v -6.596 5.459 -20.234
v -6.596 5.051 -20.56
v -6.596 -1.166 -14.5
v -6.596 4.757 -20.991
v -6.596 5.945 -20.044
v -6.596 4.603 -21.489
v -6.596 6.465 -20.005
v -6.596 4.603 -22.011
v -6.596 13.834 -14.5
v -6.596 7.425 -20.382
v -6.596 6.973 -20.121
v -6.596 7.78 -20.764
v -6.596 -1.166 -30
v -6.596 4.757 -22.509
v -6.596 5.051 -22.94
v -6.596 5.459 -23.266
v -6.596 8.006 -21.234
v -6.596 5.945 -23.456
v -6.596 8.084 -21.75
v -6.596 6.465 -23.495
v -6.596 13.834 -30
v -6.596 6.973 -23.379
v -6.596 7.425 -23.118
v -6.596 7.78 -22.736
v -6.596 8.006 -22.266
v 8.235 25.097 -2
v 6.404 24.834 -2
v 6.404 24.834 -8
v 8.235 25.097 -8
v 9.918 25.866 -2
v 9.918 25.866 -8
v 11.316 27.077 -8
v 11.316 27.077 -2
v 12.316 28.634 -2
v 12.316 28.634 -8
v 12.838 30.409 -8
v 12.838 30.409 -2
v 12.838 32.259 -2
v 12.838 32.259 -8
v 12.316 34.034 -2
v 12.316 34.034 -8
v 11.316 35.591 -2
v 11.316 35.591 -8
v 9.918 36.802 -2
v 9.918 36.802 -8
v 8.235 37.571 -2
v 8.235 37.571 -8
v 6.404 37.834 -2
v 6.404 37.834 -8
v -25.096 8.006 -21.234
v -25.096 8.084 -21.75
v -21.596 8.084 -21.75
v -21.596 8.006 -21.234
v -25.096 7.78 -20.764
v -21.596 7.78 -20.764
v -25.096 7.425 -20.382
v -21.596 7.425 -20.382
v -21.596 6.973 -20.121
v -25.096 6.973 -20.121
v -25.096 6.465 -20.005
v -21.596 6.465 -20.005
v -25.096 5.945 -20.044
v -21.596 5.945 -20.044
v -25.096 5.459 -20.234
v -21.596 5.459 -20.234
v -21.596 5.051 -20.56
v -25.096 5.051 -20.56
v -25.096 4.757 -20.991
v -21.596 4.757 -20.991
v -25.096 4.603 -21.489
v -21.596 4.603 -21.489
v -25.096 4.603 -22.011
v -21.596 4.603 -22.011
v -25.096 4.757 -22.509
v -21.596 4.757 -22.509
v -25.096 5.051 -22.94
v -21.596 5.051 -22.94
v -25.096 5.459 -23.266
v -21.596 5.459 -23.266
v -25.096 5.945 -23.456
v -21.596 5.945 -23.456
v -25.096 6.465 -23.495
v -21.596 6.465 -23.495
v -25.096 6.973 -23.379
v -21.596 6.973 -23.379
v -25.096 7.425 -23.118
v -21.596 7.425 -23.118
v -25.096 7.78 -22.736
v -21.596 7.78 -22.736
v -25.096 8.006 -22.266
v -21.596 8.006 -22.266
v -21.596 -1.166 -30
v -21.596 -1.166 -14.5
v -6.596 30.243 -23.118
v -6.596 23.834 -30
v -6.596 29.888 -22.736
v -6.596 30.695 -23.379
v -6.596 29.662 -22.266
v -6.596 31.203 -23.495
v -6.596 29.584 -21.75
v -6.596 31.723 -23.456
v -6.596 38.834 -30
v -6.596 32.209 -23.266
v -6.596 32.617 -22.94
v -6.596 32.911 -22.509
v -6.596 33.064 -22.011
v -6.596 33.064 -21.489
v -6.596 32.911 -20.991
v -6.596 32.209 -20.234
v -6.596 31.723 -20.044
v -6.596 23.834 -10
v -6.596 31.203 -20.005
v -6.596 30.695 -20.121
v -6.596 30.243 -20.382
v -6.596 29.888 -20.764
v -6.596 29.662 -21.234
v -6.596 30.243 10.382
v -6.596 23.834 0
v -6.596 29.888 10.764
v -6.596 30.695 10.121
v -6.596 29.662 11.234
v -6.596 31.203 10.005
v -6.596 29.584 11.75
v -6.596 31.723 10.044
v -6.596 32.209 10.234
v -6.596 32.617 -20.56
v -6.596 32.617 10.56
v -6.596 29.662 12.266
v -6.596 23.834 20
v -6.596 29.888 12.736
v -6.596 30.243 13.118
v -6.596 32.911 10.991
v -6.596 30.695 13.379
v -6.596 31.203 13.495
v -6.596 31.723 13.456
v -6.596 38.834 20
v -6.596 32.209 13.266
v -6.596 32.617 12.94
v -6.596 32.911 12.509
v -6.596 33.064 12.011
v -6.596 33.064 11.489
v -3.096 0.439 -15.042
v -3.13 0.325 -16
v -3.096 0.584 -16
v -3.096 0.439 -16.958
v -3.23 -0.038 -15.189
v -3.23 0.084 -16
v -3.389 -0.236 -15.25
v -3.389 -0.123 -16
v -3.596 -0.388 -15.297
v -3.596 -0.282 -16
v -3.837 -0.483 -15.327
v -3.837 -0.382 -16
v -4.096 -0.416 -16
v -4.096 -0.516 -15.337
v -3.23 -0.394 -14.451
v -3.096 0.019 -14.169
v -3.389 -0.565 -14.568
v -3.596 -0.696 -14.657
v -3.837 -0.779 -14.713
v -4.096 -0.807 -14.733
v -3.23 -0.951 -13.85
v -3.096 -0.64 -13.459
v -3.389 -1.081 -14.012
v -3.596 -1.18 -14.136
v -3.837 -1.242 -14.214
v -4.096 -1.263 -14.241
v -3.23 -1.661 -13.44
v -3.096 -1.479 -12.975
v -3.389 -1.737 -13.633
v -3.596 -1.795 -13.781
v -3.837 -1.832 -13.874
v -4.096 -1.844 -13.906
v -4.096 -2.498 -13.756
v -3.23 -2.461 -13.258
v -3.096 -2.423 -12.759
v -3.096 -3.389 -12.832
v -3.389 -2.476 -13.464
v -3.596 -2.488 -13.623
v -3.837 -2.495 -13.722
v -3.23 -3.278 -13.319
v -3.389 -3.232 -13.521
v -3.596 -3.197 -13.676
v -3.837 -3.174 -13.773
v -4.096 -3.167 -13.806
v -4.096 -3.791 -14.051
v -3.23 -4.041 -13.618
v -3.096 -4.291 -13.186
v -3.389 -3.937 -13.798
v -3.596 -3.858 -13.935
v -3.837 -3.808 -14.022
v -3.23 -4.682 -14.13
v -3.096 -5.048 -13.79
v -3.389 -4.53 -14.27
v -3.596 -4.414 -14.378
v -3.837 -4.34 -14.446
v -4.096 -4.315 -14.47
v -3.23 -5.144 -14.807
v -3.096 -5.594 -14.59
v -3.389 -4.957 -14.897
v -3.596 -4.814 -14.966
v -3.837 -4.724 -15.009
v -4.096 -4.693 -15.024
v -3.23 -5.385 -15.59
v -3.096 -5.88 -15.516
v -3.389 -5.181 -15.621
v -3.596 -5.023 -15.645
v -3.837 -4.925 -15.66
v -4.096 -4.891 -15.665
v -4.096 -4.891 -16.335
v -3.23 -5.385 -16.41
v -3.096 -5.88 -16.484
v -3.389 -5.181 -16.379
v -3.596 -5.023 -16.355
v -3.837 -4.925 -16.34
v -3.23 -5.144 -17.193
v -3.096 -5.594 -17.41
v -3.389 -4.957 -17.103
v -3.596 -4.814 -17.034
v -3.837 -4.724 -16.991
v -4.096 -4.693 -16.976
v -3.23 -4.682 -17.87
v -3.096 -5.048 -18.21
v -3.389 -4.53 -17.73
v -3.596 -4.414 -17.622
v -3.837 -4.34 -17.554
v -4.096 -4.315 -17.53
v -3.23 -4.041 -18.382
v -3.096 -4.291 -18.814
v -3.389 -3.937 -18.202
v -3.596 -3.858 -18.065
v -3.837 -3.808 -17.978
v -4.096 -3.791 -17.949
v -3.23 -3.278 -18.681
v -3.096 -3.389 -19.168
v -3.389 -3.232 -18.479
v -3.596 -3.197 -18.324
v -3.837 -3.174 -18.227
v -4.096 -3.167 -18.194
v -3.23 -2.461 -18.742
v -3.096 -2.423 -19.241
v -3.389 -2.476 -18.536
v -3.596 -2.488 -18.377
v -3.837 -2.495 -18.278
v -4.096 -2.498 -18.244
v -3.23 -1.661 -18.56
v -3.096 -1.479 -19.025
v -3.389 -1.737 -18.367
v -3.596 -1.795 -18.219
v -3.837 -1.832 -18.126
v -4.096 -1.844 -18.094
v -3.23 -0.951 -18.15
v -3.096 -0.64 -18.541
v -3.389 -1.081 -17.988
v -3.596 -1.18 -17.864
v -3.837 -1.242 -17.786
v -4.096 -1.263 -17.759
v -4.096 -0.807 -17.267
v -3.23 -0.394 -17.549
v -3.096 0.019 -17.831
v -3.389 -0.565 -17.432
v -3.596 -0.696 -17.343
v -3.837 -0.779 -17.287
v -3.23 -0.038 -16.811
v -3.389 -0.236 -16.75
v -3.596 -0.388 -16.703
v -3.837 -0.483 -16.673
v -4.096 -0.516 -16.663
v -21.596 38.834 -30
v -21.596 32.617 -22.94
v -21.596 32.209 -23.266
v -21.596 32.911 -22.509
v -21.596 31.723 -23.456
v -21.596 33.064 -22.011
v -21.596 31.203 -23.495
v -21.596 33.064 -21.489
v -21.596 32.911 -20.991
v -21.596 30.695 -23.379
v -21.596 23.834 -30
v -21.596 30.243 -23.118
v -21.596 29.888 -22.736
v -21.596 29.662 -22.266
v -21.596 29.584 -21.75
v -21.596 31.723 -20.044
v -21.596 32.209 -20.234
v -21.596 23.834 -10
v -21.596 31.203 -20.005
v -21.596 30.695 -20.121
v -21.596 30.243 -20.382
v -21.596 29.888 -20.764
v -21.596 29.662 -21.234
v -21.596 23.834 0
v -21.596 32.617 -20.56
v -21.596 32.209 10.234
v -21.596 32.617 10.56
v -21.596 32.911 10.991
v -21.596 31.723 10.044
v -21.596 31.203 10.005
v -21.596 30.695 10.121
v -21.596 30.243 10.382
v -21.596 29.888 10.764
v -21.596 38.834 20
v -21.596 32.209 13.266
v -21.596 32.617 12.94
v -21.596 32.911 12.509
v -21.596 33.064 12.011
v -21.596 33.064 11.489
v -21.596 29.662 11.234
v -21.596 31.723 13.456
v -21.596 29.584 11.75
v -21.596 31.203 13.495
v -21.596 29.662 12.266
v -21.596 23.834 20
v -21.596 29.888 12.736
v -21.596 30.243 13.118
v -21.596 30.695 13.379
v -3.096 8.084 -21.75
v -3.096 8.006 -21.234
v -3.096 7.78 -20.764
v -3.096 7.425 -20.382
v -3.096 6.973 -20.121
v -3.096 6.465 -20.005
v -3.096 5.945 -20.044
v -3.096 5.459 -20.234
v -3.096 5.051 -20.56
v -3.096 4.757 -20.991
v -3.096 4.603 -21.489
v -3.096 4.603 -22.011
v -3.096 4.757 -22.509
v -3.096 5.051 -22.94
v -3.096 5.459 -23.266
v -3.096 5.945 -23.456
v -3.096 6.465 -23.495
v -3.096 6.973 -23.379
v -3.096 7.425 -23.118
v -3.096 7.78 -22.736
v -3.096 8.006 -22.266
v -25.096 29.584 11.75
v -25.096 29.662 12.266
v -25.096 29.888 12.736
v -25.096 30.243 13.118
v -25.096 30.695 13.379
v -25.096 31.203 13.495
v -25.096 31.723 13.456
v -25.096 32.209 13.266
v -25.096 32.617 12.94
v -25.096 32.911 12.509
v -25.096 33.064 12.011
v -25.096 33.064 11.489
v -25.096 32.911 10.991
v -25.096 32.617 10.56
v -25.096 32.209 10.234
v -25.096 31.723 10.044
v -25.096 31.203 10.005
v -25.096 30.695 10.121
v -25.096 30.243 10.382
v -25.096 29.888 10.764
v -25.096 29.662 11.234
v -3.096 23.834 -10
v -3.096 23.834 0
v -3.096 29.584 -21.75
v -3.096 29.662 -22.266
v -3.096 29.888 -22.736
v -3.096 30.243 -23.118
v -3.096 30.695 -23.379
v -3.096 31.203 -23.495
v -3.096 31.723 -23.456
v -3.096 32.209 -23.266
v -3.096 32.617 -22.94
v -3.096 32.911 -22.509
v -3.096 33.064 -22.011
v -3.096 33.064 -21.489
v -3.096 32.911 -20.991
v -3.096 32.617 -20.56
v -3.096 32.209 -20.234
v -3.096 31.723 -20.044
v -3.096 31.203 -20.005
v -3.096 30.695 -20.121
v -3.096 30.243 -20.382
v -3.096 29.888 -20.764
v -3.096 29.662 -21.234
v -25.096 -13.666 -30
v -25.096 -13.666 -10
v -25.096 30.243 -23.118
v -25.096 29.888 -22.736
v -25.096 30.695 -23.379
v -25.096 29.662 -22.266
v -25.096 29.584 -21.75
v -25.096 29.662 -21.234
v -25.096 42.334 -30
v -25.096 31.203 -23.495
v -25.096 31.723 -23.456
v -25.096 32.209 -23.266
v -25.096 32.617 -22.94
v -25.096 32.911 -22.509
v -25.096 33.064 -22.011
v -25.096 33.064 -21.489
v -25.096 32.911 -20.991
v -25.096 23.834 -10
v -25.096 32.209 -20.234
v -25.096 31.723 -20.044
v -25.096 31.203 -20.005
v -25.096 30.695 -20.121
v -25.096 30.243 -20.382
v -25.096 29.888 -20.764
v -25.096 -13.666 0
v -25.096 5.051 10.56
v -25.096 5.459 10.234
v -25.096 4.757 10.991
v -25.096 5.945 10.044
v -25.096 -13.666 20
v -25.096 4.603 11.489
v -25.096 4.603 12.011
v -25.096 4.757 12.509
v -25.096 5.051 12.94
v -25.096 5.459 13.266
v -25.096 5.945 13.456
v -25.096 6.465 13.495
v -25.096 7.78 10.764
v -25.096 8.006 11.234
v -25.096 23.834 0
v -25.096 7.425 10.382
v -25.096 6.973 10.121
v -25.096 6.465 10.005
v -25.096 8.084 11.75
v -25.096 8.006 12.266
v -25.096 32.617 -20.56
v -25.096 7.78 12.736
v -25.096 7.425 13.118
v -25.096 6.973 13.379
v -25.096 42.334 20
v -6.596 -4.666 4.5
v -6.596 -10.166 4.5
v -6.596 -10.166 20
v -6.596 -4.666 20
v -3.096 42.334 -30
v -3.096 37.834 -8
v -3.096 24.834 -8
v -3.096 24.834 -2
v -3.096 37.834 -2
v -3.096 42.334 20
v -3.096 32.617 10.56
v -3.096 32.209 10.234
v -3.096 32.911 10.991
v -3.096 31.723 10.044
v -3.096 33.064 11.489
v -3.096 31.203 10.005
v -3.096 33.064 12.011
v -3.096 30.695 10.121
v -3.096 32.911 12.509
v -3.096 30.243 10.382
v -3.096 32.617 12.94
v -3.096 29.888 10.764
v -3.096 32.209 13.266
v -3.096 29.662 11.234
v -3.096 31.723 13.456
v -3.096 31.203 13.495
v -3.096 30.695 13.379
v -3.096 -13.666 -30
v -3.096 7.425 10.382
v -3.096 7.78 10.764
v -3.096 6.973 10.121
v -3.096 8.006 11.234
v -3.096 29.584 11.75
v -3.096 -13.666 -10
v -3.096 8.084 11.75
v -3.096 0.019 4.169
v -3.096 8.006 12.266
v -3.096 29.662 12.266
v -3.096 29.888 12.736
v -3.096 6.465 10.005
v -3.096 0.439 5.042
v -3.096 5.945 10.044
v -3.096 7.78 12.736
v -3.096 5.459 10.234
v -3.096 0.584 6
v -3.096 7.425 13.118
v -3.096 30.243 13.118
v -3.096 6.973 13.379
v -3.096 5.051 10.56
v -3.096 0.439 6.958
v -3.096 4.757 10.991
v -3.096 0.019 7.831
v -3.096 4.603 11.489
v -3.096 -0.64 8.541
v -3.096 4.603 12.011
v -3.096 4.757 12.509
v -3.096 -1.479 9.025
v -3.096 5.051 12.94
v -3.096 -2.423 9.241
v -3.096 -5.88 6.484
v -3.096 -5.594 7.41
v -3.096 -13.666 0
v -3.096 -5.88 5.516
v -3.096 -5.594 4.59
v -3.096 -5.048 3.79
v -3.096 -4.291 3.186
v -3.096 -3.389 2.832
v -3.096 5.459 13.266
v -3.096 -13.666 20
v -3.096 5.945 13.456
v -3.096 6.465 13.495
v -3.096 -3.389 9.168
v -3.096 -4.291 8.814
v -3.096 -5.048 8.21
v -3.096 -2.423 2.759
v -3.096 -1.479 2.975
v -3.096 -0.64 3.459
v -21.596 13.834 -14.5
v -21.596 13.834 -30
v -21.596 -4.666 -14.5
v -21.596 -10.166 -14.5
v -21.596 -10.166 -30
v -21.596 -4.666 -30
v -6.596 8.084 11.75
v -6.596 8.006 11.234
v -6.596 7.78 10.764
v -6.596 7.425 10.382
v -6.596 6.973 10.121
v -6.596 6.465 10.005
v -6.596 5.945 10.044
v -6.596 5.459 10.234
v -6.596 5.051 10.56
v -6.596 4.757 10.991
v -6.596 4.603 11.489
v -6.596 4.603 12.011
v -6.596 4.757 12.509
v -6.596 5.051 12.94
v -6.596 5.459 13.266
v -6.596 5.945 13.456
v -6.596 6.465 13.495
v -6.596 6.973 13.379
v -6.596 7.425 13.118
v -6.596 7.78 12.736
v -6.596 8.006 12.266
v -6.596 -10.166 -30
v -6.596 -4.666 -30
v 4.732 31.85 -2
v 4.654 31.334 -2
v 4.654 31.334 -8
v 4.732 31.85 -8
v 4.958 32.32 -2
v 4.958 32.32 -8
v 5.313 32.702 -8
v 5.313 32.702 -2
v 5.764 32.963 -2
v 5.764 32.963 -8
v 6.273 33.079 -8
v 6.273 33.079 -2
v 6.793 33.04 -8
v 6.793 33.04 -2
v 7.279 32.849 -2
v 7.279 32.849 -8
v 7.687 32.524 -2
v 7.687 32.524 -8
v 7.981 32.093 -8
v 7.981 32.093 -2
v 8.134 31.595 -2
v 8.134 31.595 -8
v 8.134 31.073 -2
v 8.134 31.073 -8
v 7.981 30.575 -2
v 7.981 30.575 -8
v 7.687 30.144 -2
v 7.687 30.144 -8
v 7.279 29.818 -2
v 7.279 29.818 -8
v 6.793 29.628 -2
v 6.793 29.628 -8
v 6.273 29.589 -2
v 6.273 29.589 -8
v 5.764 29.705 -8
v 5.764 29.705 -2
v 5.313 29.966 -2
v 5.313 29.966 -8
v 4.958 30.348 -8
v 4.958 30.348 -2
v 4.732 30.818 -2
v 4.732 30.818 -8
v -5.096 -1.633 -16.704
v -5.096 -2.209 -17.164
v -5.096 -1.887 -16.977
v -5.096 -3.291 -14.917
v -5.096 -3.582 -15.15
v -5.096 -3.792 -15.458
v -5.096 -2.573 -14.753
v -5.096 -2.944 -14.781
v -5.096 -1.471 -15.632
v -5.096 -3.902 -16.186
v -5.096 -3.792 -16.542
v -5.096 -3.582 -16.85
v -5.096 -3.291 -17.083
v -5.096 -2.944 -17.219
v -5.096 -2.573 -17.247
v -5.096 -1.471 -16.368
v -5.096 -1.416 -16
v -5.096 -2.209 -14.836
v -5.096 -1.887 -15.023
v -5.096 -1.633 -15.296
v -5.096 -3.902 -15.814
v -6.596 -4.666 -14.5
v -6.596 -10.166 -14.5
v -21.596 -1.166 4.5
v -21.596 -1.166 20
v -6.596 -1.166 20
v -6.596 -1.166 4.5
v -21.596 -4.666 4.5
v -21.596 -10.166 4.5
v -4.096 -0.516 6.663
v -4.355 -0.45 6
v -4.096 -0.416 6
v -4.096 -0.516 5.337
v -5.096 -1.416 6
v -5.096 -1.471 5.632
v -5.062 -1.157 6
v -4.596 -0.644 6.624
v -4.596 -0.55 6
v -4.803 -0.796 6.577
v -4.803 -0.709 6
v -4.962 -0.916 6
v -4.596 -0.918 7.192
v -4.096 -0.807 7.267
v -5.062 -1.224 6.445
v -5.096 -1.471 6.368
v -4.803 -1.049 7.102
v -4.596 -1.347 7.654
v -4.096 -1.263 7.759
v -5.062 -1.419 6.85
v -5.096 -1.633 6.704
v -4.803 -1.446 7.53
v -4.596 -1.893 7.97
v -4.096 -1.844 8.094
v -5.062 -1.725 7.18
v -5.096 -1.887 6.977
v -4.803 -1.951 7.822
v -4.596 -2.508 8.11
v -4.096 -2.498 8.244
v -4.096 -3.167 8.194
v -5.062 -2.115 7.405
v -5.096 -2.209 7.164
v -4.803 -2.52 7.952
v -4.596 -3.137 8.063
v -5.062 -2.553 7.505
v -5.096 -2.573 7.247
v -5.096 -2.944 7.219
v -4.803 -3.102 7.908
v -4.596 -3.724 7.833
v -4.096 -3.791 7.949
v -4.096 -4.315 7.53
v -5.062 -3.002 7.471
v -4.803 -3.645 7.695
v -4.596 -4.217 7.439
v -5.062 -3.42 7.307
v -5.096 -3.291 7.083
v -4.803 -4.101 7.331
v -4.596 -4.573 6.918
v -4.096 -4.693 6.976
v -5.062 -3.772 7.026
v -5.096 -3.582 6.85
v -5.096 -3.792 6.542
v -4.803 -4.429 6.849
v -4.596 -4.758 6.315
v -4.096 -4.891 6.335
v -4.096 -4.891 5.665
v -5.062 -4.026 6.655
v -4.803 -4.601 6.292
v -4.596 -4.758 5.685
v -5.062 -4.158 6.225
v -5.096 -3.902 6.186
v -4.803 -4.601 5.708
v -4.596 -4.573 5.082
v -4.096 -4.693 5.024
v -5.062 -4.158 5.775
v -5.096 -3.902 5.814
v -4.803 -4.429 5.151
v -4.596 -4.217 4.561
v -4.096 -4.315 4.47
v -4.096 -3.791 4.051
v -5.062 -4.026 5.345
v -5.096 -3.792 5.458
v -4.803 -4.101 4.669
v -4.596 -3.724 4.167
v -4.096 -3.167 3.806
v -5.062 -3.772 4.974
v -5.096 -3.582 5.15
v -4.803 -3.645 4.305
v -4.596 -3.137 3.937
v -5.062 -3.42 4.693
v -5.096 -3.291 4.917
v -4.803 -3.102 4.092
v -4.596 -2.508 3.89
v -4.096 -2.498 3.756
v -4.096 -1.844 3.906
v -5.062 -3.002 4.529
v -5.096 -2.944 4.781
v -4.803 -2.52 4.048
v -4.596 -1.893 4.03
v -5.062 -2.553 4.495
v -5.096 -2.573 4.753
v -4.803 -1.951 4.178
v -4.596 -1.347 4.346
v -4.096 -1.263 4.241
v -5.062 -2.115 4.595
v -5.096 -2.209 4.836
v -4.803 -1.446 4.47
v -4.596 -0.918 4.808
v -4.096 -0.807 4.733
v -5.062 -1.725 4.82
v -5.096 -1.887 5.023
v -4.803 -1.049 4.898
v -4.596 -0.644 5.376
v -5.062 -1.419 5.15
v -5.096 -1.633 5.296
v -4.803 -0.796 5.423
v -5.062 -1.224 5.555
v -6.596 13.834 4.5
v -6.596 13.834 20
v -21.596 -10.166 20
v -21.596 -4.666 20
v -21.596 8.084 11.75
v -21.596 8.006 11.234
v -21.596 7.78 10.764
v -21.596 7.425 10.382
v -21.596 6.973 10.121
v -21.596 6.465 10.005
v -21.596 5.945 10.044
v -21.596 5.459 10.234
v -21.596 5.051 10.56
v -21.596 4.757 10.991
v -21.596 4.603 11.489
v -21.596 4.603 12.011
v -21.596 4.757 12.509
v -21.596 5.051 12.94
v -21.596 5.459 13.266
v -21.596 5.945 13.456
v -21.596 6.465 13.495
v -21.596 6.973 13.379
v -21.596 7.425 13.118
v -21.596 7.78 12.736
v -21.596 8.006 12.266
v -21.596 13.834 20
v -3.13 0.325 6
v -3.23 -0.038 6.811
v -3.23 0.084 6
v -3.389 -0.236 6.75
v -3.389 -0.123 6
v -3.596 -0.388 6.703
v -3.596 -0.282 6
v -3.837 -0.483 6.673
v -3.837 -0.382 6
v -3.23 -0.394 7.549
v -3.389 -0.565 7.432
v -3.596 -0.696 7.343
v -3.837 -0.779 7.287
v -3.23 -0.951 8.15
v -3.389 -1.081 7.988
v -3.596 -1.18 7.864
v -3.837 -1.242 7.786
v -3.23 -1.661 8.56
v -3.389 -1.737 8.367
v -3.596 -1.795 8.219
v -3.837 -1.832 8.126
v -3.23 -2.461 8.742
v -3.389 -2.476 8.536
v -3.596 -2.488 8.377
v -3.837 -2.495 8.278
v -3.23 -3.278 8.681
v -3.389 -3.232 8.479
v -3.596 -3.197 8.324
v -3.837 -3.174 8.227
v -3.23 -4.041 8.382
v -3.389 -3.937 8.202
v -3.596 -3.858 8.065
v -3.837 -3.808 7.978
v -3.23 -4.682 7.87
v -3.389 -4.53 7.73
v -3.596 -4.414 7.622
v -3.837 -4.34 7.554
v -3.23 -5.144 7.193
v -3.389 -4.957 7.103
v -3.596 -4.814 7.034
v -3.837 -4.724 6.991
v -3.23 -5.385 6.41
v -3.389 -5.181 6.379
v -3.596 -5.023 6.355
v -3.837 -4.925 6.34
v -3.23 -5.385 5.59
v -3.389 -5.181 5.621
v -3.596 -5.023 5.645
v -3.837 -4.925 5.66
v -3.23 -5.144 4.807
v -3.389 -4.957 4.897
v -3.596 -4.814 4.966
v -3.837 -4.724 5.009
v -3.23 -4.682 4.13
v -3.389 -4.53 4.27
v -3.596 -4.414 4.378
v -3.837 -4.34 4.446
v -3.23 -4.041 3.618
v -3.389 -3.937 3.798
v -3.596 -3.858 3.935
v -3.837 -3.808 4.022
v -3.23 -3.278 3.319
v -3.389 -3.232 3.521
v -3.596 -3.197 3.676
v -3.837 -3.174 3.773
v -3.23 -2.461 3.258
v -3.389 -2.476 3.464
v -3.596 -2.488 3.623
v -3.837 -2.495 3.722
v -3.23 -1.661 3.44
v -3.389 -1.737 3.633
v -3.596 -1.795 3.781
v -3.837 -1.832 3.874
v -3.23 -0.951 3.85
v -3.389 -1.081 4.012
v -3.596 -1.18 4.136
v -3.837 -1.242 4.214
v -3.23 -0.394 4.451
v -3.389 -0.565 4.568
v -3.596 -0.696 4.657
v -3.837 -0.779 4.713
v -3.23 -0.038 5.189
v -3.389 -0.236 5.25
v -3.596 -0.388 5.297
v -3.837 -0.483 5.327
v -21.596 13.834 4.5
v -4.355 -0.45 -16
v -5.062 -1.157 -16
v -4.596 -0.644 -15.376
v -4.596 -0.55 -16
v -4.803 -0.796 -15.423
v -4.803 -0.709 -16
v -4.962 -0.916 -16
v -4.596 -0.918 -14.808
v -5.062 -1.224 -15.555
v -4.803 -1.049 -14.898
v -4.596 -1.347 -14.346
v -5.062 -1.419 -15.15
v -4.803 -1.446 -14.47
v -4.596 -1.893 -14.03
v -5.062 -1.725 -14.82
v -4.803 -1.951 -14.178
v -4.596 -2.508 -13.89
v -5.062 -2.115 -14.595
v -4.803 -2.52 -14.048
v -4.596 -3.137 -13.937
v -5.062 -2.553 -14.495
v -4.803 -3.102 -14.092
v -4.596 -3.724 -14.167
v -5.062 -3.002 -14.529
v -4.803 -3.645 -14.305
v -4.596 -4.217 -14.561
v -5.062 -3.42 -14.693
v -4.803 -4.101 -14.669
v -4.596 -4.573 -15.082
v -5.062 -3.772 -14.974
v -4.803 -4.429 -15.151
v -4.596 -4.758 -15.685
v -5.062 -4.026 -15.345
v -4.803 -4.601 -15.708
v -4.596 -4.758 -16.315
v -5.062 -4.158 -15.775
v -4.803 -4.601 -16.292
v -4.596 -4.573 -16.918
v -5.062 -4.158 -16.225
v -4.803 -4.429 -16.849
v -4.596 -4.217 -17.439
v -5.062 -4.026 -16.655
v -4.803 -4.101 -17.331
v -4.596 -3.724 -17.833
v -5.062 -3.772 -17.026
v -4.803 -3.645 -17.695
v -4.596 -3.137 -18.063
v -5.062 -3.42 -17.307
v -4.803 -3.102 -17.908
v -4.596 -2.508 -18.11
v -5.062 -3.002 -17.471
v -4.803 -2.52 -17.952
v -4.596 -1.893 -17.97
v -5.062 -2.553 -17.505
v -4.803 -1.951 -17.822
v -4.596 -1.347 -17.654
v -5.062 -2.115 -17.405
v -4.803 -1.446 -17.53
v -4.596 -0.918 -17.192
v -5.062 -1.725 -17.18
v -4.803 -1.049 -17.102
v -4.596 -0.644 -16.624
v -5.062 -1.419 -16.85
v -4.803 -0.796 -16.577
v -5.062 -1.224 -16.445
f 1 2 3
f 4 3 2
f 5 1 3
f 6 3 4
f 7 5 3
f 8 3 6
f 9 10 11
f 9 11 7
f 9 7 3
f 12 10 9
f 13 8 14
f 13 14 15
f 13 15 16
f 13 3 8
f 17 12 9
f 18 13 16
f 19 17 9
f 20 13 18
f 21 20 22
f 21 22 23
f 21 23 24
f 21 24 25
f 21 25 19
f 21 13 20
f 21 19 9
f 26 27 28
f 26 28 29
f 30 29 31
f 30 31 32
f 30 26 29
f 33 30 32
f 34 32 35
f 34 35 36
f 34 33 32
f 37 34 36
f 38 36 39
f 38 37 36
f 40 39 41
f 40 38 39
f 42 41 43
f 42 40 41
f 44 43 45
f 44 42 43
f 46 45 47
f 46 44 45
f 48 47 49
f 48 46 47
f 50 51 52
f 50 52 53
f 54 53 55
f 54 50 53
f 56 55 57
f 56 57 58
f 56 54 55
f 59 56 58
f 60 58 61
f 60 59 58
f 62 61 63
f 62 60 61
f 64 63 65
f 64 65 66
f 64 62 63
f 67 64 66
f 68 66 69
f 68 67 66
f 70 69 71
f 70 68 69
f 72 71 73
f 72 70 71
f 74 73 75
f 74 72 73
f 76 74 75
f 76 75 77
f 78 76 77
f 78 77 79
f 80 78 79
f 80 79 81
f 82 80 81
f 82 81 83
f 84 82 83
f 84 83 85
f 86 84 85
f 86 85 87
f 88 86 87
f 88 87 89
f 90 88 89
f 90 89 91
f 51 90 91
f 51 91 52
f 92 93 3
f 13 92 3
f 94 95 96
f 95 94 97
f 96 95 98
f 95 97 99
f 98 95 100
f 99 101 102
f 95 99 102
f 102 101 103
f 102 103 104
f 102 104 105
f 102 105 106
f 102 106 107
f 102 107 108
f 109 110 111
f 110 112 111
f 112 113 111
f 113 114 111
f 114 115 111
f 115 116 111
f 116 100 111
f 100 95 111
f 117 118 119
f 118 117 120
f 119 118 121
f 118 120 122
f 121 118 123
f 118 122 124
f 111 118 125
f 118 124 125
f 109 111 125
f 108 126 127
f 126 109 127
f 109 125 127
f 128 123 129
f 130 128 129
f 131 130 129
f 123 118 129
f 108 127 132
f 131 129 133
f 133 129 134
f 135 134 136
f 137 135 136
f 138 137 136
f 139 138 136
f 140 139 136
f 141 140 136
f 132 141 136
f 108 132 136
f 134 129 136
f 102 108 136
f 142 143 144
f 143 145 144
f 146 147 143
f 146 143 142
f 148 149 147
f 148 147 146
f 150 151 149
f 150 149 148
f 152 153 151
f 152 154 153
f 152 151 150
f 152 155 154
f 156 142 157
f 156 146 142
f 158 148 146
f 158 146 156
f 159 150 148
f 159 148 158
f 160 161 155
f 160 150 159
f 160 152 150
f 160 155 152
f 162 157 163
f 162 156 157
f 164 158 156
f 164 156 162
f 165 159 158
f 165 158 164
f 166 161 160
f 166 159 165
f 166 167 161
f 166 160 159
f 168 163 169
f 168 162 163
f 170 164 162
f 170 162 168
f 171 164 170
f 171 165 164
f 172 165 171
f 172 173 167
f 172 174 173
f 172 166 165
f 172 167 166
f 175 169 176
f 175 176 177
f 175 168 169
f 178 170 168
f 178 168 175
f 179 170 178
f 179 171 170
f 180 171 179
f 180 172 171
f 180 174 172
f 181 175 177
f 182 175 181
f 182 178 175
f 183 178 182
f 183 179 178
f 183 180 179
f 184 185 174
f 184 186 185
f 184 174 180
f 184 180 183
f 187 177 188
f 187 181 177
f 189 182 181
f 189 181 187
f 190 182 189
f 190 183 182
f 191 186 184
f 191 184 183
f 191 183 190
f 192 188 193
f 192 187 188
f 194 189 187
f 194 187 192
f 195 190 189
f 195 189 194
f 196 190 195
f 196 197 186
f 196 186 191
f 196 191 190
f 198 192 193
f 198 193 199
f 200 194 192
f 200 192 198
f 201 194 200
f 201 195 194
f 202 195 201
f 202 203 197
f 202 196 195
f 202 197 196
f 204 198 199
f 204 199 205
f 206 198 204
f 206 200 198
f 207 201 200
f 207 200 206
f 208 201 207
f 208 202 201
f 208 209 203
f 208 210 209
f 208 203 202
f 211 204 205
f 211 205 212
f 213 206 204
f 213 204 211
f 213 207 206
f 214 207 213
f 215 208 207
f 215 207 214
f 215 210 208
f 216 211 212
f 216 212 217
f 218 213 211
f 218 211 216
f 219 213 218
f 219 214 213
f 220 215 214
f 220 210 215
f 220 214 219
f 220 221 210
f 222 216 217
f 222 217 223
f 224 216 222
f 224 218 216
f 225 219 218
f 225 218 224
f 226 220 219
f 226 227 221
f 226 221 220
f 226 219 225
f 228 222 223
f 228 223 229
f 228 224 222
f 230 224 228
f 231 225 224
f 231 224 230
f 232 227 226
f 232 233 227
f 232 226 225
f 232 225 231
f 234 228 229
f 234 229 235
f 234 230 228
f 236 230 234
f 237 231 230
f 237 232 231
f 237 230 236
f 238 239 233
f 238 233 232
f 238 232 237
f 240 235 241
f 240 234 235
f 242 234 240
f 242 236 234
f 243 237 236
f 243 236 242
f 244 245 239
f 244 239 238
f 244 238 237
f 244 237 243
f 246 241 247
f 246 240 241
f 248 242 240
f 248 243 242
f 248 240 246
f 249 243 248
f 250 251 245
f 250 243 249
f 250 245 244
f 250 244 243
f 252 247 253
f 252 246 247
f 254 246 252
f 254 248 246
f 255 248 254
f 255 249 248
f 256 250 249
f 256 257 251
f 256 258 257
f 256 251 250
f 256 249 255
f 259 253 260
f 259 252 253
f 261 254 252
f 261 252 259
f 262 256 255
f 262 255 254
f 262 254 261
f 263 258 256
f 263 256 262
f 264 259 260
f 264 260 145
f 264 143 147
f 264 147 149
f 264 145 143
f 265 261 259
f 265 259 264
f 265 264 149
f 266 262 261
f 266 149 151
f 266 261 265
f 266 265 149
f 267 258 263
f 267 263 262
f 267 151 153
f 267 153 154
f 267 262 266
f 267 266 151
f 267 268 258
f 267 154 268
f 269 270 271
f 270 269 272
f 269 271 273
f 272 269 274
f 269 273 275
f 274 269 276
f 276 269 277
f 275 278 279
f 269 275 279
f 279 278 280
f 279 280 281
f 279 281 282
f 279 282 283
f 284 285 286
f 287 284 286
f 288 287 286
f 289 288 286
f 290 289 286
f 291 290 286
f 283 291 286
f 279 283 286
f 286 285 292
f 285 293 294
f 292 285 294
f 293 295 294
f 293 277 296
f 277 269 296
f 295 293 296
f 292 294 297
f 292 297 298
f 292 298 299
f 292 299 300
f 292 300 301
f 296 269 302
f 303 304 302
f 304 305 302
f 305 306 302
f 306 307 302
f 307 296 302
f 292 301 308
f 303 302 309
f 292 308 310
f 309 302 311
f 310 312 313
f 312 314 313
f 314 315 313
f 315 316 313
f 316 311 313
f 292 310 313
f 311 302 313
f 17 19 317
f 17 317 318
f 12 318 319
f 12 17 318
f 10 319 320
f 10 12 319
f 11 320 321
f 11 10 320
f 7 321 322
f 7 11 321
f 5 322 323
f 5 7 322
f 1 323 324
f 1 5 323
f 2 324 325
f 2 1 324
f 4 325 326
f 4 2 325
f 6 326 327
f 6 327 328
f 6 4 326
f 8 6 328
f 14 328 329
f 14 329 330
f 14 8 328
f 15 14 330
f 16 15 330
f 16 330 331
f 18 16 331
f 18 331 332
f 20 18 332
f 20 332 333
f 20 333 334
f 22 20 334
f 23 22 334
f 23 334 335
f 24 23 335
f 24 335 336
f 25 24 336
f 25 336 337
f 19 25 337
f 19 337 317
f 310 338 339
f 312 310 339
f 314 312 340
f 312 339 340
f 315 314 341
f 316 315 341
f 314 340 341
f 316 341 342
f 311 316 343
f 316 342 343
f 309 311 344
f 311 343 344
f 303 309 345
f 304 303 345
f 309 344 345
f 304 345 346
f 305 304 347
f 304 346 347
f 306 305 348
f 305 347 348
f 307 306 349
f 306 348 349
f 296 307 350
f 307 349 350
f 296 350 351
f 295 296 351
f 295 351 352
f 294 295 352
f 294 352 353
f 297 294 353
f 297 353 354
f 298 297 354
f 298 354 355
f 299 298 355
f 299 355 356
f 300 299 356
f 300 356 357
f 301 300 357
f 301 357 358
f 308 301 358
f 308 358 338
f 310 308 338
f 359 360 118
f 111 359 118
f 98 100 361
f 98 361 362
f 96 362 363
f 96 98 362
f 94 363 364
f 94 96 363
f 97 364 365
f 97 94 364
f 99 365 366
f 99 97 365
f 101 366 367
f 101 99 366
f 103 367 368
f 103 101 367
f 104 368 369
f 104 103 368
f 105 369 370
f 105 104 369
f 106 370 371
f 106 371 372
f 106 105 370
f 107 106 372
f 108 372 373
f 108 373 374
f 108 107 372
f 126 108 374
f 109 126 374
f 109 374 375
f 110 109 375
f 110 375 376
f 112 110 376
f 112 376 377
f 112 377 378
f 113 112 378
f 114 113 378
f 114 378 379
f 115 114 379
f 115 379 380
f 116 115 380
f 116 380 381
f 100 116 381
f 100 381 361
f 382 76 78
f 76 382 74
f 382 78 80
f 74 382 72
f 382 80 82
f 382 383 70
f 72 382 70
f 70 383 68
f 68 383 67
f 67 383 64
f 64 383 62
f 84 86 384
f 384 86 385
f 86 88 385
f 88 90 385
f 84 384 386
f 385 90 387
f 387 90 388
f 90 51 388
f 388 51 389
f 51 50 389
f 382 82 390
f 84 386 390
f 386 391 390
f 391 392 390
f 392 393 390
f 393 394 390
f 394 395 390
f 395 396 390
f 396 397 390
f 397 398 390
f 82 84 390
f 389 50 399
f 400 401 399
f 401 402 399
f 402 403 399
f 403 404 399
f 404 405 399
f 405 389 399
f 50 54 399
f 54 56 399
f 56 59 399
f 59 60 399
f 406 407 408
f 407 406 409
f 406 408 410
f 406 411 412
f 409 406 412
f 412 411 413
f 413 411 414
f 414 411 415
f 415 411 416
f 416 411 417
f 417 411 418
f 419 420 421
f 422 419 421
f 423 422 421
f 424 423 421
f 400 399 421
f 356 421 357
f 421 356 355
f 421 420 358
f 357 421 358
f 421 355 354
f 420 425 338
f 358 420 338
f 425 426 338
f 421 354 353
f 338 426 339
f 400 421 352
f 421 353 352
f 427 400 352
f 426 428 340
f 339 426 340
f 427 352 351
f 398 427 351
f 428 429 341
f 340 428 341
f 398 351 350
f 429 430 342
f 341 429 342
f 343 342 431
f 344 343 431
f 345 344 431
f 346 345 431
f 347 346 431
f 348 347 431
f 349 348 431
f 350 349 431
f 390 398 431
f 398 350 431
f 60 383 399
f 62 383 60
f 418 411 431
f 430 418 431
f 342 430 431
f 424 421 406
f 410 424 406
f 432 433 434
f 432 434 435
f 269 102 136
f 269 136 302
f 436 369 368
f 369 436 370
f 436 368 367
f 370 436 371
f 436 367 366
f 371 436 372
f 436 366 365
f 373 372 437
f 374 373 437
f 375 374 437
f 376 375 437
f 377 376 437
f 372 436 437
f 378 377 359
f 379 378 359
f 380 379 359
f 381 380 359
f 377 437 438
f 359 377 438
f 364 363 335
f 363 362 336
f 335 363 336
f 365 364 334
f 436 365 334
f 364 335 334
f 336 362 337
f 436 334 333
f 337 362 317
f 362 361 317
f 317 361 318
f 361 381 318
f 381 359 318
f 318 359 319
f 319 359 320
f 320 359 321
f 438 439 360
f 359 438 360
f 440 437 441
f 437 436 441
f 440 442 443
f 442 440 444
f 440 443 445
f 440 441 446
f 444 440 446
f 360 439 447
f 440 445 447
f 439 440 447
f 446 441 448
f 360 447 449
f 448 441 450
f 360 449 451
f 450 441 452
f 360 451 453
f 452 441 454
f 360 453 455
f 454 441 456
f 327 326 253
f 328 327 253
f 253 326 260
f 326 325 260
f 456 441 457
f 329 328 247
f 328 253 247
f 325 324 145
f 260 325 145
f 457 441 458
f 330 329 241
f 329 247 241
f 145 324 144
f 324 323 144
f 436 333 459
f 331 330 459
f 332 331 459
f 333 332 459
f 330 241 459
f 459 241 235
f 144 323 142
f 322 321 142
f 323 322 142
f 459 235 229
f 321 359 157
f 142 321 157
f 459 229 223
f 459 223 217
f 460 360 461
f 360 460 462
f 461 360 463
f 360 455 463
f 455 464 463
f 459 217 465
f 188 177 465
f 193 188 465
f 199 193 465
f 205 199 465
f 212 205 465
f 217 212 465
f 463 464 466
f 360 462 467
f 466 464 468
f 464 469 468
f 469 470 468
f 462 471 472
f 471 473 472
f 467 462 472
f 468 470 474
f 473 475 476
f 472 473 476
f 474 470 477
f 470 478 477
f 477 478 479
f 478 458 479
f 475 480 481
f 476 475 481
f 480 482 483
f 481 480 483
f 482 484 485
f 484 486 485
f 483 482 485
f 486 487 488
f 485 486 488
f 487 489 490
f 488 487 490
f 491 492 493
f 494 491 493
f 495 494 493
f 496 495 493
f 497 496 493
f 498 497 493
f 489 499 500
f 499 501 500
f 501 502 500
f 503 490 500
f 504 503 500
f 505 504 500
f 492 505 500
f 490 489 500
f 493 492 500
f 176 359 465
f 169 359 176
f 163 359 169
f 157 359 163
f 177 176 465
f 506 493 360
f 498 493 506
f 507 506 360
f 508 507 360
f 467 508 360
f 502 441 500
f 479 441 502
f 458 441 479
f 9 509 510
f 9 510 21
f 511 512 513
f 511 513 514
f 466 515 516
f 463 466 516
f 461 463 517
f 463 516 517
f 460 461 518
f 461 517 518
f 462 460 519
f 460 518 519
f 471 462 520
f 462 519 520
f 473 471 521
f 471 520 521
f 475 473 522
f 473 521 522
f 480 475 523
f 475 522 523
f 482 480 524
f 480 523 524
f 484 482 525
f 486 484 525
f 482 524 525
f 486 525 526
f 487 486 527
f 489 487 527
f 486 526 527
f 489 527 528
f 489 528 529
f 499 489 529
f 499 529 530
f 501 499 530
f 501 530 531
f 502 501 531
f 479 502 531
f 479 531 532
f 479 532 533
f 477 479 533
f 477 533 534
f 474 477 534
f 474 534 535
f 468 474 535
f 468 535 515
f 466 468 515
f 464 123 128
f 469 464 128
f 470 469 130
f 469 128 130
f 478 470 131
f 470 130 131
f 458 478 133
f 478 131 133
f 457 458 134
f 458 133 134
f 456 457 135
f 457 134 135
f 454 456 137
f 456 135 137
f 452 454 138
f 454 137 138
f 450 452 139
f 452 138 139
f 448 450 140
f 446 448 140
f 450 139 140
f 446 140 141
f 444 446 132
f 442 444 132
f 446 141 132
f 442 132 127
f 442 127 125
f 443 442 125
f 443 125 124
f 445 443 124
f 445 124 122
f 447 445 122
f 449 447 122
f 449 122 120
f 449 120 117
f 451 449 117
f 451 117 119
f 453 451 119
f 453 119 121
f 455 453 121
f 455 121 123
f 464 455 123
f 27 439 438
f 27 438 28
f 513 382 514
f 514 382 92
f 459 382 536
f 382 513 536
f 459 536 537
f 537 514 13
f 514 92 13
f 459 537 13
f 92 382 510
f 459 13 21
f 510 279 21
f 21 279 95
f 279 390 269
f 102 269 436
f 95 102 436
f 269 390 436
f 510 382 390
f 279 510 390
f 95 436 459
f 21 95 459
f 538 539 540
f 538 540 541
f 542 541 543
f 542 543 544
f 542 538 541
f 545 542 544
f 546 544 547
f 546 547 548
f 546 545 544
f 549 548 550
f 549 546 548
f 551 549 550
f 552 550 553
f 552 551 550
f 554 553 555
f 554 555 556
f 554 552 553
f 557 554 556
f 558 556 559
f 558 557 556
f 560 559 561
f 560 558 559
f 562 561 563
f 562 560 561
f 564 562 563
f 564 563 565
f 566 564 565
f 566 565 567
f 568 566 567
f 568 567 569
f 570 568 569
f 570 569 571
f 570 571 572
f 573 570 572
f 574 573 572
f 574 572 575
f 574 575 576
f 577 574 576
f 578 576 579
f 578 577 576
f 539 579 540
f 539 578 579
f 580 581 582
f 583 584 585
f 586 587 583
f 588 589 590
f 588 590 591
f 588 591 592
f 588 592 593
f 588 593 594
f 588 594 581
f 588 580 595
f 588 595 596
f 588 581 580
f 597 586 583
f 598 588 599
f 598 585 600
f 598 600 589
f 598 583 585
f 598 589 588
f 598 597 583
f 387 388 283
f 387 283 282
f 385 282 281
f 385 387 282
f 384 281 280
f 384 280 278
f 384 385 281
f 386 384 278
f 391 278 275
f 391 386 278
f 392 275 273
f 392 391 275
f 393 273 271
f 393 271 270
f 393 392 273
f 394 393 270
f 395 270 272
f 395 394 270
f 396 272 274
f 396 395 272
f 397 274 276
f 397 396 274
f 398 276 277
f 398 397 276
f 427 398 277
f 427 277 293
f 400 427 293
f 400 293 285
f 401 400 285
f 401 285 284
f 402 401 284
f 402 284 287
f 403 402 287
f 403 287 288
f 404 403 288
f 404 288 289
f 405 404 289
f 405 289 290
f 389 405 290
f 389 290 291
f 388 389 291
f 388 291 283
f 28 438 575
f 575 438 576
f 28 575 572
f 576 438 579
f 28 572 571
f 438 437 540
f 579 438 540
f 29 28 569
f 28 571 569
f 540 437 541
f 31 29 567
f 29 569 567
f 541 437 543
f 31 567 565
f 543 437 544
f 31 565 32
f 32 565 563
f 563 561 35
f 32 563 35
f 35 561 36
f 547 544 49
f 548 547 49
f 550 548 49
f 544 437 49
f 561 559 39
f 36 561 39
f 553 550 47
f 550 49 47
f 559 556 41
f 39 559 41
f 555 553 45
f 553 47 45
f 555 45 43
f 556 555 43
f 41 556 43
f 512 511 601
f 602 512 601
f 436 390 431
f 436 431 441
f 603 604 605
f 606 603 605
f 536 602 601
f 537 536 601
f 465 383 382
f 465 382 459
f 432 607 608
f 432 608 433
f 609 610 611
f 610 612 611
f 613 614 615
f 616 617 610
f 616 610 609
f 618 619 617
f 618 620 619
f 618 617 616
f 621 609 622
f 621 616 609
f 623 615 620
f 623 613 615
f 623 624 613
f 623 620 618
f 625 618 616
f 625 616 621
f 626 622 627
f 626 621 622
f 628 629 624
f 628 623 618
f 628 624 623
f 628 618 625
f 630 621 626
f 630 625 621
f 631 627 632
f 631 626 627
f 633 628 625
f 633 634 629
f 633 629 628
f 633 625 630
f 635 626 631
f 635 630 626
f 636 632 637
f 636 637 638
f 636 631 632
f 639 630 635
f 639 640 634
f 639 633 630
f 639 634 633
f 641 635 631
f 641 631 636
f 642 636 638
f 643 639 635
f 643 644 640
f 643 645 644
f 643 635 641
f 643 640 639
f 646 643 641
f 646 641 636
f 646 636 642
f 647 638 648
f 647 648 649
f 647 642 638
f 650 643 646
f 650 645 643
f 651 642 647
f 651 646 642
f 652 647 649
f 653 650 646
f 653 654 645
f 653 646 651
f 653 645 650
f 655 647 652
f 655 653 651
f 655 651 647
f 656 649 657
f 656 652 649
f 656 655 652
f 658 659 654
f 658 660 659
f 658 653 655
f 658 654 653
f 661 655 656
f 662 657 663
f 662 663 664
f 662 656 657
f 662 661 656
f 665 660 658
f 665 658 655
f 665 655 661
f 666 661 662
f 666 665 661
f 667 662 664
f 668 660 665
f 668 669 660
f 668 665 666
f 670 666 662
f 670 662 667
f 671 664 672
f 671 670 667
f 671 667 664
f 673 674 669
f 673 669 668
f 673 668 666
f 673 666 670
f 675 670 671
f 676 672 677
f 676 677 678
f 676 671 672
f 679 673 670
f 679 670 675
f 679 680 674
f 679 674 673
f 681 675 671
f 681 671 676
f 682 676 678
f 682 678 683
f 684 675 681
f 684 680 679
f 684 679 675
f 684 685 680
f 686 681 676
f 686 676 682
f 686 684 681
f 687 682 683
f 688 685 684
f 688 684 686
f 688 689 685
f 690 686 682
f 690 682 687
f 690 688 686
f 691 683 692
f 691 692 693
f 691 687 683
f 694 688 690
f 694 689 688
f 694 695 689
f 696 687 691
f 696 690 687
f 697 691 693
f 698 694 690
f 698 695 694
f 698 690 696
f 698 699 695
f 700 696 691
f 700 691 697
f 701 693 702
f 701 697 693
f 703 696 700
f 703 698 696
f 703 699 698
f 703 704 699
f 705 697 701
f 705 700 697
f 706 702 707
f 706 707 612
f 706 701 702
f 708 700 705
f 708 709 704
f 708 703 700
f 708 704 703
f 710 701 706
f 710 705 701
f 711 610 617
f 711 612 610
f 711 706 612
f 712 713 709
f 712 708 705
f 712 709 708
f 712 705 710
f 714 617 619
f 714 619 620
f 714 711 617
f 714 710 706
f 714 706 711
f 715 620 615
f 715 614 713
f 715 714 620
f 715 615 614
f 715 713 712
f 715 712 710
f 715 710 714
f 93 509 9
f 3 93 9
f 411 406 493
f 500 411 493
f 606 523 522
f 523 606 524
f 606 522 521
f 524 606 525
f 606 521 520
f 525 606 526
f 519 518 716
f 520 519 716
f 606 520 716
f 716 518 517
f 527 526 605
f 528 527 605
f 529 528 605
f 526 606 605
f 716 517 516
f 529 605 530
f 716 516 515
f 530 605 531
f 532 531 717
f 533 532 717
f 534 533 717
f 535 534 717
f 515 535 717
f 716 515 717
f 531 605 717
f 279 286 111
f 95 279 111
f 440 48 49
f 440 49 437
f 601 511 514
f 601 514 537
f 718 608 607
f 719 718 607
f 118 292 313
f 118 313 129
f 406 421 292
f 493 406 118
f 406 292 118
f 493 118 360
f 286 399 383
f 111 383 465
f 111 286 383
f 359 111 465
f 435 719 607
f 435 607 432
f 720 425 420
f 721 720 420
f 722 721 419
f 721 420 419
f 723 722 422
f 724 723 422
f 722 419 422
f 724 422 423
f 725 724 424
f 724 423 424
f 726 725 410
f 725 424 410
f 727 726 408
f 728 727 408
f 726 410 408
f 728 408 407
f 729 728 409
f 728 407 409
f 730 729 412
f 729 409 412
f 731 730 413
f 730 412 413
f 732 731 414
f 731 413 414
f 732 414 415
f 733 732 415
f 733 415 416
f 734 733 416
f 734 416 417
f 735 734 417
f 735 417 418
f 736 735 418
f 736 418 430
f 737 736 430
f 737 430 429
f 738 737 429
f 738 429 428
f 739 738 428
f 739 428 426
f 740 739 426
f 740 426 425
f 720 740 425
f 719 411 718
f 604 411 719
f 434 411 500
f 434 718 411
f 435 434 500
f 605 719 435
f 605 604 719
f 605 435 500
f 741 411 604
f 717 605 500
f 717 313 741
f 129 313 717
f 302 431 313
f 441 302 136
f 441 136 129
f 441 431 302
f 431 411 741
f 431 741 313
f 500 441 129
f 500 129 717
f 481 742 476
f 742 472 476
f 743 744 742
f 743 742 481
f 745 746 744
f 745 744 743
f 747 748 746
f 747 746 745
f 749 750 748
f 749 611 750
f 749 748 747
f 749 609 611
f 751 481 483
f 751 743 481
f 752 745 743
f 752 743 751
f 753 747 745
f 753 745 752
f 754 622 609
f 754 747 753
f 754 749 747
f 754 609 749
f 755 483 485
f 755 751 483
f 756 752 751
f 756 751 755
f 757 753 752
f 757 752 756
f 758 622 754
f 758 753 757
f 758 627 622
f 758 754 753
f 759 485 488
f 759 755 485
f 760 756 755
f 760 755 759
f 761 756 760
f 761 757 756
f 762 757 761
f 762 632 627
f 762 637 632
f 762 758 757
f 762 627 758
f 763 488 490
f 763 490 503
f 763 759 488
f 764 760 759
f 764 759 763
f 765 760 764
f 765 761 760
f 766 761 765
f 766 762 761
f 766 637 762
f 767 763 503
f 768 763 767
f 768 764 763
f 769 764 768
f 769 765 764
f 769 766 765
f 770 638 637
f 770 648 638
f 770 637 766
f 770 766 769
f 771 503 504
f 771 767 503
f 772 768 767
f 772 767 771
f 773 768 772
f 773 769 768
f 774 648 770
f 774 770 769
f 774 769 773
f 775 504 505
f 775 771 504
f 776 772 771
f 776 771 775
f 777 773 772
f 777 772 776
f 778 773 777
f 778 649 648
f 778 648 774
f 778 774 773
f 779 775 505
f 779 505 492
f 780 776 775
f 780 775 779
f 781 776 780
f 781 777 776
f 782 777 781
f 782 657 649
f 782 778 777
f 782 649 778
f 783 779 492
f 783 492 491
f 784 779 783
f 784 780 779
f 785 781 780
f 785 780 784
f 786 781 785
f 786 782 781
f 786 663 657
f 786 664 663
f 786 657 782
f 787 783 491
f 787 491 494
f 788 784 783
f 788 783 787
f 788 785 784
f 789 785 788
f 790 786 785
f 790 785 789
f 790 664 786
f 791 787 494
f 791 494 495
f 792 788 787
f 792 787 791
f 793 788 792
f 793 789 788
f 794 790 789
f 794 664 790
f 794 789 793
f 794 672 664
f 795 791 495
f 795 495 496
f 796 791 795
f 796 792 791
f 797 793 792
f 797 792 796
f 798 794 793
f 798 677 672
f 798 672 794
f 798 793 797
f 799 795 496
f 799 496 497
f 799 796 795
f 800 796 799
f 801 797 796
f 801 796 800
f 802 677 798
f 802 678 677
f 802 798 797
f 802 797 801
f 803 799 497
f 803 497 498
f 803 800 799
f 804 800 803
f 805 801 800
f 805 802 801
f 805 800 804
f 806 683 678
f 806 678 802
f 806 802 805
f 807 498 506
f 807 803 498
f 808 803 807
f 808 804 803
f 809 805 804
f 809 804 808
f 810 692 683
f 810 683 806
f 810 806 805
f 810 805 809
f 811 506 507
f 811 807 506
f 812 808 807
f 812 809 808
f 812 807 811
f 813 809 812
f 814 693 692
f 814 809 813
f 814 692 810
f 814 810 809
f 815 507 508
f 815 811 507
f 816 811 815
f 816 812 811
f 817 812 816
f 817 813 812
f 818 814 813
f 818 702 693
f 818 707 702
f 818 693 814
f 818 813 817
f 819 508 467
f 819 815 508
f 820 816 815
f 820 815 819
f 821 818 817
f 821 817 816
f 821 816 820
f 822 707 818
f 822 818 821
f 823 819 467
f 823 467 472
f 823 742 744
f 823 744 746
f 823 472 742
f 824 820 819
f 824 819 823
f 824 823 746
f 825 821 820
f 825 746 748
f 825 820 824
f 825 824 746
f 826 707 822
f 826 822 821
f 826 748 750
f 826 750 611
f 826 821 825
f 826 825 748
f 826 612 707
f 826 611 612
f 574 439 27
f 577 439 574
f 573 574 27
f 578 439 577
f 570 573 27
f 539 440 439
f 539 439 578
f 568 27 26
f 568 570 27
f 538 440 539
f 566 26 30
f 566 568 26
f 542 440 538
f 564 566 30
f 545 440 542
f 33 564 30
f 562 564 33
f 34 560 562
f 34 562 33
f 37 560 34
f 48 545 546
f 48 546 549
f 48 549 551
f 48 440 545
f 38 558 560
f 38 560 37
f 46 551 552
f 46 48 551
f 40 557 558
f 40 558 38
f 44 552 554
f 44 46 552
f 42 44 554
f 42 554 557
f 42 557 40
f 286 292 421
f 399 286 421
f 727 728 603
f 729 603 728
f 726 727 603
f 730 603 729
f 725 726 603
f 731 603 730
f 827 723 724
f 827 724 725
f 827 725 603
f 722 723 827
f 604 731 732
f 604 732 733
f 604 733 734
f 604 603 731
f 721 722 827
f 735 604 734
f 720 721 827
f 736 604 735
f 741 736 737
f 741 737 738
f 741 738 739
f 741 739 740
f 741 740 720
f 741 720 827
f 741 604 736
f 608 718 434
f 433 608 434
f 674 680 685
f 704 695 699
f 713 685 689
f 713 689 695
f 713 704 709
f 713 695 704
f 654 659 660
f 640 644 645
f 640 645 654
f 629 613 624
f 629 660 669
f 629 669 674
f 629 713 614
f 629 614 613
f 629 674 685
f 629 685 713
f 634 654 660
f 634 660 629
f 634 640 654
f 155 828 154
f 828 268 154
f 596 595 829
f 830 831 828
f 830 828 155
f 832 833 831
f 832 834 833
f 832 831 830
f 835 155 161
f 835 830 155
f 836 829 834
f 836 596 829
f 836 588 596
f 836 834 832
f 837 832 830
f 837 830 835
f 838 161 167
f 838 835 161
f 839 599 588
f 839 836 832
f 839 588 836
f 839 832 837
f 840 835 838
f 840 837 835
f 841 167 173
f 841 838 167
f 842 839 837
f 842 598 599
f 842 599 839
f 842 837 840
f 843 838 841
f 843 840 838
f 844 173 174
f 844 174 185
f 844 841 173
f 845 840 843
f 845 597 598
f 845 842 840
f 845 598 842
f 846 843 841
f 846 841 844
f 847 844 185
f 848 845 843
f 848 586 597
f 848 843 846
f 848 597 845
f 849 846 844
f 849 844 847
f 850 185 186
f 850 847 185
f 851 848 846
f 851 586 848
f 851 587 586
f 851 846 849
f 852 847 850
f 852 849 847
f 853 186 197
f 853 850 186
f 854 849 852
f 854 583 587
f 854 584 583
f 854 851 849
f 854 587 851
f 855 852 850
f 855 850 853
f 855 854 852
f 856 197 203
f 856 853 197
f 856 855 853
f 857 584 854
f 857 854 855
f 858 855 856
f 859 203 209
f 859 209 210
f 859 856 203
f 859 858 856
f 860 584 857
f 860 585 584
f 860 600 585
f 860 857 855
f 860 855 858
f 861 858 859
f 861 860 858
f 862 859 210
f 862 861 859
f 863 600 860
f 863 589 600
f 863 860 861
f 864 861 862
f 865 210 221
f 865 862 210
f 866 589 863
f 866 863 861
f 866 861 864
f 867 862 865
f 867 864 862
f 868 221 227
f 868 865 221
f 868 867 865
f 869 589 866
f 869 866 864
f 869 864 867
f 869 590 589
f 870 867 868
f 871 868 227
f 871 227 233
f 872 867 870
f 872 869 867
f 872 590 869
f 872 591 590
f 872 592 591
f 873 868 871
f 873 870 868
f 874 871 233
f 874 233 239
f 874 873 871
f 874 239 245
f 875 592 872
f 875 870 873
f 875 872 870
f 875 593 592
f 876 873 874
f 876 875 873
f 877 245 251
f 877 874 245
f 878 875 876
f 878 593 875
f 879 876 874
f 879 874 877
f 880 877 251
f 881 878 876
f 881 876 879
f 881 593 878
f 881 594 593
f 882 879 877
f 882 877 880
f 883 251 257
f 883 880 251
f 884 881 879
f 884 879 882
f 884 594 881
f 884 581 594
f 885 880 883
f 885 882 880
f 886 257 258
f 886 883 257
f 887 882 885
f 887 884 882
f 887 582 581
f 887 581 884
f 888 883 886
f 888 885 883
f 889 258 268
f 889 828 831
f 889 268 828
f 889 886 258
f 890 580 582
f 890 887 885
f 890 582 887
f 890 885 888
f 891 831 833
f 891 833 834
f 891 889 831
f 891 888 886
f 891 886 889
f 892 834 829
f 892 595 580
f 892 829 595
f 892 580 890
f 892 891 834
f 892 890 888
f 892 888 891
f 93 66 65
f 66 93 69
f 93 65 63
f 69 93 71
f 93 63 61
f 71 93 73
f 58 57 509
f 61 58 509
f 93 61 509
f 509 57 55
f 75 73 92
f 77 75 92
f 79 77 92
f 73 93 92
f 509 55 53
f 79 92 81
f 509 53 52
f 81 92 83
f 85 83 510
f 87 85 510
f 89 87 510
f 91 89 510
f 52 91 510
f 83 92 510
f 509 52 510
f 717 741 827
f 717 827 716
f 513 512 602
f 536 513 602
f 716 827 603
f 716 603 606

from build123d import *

# Parameters (mm, degrees)
SKETCH1_W                = 22
SKETCH1_H                = 56
SKETCH1_W_2              = 15
SKETCH1_H_2              = 15
BOSS_EXTRUDE1_DEPTH      = 20
SKETCH2_W                = 15
SKETCH2_H                = 15
SKETCH2_H_2              = 5.5
CUT_EXTRUDE1_DEPTH       = 15.5
SKETCH3_R                = 1.75
CUT_EXTRUDE2_DEPTH       = 35
BOSS_EXTRUDE2_DEPTH      = 10
BOSS_EXTRUDE3_DEPTH      = 3
BOSS_EXTRUDE3_DEPTH_BACK = 3
SKETCH6_R                = 1.75
SKETCH7_R                = 2.25
CUT_EXTRUDE3_DEPTH       = 2
FILLET1_R                = 1


with BuildPart() as part:
    # Sketch1 → Boss-Extrude1 (new body)
    with BuildSketch(Plane.XY):
        with Locations((-14.096172604, 14.333947726)):
            Rectangle(SKETCH1_W, SKETCH1_H)
        with Locations((-14.096172604, 31.333947726)):
            Rectangle(SKETCH1_W_2, SKETCH1_H_2, mode=Mode.SUBTRACT)
    extrude(amount=BOSS_EXTRUDE1_DEPTH)

    # Sketch2 → Cut-Extrude1 (cut)
    with BuildSketch(Plane.XY.offset(20)):
        with Locations((-14.096172604, 6.333947726)):
            Rectangle(SKETCH2_W, SKETCH2_H)
        with Locations((-14.096172604, -7.416052274)):
            Rectangle(SKETCH2_W, SKETCH2_H_2)
    extrude(amount=-CUT_EXTRUDE1_DEPTH, mode=Mode.SUBTRACT)

    # Sketch3 → Cut-Extrude2 (cut)
    with BuildSketch(Plane.ZY.offset(25.096172604)):
        with Locations(Location((11.75, 31.333947726, 0), (0, 0, 270))):
            Circle(SKETCH3_R)
        with Locations(Location((11.75, 6.333947726, 0), (0, 0, 90))):
            Circle(SKETCH3_R)
    extrude(amount=-CUT_EXTRUDE2_DEPTH, mode=Mode.SUBTRACT)


with BuildPart() as body_2:
    # Mirror3: mirrored copy
    add(part.part.mirror(Plane(origin=(0, 0, -5), x_dir=(1, 0, 0), z_dir=(0, 0, -1))))


with BuildPart() as part_1:
    add(part.part)

    add(body_2.part)  # Boss-Extrude2 merges body 2
    # Sketch4 → Boss-Extrude2 (add)
    with BuildSketch(Plane(origin=(0, 0, 0), x_dir=(-1, 0, 0), z_dir=(0, 0, -1))):
        Polygon((6.596172604, 38.833947726), (21.596172604, 38.833947726), (21.596172604, 23.833947726), (25.096172604, 23.833947726), (25.096172604, 42.333947726), (3.096172604, 42.333947726), (3.096172604, 23.833947726), (6.596172604, 23.833947726), align=None)
    extrude(amount=BOSS_EXTRUDE2_DEPTH)

    # Sketch6 → Boss-Extrude3 (add, two sides: drawn at the far end of the back side and taken through both)
    with BuildSketch(Plane(origin=(0, 0, -5), x_dir=(-1, 0, 0), z_dir=(0, 0, -1)).offset(-BOSS_EXTRUDE3_DEPTH_BACK)):
        with BuildLine():
            Line((-6.403827396, 37.833947726), (3.096172604, 37.833947726))
            Line((3.096172604, 37.833947726), (3.096172604, 24.833947726))
            Line((3.096172604, 24.833947726), (-6.403827396, 24.833947726))
            ThreePointArc((-6.403827396, 24.833947726), (-12.903827396, 31.333947726), (-6.403827396, 37.833947726))
        make_face()
        with Locations((-6.403827396, 31.333947726)):
            Circle(SKETCH6_R, mode=Mode.SUBTRACT)
    extrude(amount=BOSS_EXTRUDE3_DEPTH + BOSS_EXTRUDE3_DEPTH_BACK)

    # Sketch7 → Cut-Extrude3 (cut)
    with BuildSketch(Plane(origin=(-3.096172604, 0, 0), x_dir=(0, 0, -1), z_dir=(1, 0, 0))):
        with Locations(Location((16, -2.666052274, 0), (0, 0, 90))):
            Circle(SKETCH7_R)
        with Locations(Location((-6, -2.666052274, 0), (0, 0, 90))):
            Circle(SKETCH7_R)
    extrude(amount=-CUT_EXTRUDE3_DEPTH, mode=Mode.SUBTRACT)

    # Fillet1
    fillet1_edges = [part_1.edges().sort_by_distance(p)[0] for p in [
        (-5.096172604, -4.916052274, -16),
        (-3.096172604, -4.916052274, -16),
        (-5.096172604, -4.916052274, 6),
        (-3.096172604, -4.916052274, 6),
    ]]
    fillet(fillet1_edges, radius=FILLET1_R - 0.0001)  # a hair under: the kernel refuses the full size


solid = part_1.part
